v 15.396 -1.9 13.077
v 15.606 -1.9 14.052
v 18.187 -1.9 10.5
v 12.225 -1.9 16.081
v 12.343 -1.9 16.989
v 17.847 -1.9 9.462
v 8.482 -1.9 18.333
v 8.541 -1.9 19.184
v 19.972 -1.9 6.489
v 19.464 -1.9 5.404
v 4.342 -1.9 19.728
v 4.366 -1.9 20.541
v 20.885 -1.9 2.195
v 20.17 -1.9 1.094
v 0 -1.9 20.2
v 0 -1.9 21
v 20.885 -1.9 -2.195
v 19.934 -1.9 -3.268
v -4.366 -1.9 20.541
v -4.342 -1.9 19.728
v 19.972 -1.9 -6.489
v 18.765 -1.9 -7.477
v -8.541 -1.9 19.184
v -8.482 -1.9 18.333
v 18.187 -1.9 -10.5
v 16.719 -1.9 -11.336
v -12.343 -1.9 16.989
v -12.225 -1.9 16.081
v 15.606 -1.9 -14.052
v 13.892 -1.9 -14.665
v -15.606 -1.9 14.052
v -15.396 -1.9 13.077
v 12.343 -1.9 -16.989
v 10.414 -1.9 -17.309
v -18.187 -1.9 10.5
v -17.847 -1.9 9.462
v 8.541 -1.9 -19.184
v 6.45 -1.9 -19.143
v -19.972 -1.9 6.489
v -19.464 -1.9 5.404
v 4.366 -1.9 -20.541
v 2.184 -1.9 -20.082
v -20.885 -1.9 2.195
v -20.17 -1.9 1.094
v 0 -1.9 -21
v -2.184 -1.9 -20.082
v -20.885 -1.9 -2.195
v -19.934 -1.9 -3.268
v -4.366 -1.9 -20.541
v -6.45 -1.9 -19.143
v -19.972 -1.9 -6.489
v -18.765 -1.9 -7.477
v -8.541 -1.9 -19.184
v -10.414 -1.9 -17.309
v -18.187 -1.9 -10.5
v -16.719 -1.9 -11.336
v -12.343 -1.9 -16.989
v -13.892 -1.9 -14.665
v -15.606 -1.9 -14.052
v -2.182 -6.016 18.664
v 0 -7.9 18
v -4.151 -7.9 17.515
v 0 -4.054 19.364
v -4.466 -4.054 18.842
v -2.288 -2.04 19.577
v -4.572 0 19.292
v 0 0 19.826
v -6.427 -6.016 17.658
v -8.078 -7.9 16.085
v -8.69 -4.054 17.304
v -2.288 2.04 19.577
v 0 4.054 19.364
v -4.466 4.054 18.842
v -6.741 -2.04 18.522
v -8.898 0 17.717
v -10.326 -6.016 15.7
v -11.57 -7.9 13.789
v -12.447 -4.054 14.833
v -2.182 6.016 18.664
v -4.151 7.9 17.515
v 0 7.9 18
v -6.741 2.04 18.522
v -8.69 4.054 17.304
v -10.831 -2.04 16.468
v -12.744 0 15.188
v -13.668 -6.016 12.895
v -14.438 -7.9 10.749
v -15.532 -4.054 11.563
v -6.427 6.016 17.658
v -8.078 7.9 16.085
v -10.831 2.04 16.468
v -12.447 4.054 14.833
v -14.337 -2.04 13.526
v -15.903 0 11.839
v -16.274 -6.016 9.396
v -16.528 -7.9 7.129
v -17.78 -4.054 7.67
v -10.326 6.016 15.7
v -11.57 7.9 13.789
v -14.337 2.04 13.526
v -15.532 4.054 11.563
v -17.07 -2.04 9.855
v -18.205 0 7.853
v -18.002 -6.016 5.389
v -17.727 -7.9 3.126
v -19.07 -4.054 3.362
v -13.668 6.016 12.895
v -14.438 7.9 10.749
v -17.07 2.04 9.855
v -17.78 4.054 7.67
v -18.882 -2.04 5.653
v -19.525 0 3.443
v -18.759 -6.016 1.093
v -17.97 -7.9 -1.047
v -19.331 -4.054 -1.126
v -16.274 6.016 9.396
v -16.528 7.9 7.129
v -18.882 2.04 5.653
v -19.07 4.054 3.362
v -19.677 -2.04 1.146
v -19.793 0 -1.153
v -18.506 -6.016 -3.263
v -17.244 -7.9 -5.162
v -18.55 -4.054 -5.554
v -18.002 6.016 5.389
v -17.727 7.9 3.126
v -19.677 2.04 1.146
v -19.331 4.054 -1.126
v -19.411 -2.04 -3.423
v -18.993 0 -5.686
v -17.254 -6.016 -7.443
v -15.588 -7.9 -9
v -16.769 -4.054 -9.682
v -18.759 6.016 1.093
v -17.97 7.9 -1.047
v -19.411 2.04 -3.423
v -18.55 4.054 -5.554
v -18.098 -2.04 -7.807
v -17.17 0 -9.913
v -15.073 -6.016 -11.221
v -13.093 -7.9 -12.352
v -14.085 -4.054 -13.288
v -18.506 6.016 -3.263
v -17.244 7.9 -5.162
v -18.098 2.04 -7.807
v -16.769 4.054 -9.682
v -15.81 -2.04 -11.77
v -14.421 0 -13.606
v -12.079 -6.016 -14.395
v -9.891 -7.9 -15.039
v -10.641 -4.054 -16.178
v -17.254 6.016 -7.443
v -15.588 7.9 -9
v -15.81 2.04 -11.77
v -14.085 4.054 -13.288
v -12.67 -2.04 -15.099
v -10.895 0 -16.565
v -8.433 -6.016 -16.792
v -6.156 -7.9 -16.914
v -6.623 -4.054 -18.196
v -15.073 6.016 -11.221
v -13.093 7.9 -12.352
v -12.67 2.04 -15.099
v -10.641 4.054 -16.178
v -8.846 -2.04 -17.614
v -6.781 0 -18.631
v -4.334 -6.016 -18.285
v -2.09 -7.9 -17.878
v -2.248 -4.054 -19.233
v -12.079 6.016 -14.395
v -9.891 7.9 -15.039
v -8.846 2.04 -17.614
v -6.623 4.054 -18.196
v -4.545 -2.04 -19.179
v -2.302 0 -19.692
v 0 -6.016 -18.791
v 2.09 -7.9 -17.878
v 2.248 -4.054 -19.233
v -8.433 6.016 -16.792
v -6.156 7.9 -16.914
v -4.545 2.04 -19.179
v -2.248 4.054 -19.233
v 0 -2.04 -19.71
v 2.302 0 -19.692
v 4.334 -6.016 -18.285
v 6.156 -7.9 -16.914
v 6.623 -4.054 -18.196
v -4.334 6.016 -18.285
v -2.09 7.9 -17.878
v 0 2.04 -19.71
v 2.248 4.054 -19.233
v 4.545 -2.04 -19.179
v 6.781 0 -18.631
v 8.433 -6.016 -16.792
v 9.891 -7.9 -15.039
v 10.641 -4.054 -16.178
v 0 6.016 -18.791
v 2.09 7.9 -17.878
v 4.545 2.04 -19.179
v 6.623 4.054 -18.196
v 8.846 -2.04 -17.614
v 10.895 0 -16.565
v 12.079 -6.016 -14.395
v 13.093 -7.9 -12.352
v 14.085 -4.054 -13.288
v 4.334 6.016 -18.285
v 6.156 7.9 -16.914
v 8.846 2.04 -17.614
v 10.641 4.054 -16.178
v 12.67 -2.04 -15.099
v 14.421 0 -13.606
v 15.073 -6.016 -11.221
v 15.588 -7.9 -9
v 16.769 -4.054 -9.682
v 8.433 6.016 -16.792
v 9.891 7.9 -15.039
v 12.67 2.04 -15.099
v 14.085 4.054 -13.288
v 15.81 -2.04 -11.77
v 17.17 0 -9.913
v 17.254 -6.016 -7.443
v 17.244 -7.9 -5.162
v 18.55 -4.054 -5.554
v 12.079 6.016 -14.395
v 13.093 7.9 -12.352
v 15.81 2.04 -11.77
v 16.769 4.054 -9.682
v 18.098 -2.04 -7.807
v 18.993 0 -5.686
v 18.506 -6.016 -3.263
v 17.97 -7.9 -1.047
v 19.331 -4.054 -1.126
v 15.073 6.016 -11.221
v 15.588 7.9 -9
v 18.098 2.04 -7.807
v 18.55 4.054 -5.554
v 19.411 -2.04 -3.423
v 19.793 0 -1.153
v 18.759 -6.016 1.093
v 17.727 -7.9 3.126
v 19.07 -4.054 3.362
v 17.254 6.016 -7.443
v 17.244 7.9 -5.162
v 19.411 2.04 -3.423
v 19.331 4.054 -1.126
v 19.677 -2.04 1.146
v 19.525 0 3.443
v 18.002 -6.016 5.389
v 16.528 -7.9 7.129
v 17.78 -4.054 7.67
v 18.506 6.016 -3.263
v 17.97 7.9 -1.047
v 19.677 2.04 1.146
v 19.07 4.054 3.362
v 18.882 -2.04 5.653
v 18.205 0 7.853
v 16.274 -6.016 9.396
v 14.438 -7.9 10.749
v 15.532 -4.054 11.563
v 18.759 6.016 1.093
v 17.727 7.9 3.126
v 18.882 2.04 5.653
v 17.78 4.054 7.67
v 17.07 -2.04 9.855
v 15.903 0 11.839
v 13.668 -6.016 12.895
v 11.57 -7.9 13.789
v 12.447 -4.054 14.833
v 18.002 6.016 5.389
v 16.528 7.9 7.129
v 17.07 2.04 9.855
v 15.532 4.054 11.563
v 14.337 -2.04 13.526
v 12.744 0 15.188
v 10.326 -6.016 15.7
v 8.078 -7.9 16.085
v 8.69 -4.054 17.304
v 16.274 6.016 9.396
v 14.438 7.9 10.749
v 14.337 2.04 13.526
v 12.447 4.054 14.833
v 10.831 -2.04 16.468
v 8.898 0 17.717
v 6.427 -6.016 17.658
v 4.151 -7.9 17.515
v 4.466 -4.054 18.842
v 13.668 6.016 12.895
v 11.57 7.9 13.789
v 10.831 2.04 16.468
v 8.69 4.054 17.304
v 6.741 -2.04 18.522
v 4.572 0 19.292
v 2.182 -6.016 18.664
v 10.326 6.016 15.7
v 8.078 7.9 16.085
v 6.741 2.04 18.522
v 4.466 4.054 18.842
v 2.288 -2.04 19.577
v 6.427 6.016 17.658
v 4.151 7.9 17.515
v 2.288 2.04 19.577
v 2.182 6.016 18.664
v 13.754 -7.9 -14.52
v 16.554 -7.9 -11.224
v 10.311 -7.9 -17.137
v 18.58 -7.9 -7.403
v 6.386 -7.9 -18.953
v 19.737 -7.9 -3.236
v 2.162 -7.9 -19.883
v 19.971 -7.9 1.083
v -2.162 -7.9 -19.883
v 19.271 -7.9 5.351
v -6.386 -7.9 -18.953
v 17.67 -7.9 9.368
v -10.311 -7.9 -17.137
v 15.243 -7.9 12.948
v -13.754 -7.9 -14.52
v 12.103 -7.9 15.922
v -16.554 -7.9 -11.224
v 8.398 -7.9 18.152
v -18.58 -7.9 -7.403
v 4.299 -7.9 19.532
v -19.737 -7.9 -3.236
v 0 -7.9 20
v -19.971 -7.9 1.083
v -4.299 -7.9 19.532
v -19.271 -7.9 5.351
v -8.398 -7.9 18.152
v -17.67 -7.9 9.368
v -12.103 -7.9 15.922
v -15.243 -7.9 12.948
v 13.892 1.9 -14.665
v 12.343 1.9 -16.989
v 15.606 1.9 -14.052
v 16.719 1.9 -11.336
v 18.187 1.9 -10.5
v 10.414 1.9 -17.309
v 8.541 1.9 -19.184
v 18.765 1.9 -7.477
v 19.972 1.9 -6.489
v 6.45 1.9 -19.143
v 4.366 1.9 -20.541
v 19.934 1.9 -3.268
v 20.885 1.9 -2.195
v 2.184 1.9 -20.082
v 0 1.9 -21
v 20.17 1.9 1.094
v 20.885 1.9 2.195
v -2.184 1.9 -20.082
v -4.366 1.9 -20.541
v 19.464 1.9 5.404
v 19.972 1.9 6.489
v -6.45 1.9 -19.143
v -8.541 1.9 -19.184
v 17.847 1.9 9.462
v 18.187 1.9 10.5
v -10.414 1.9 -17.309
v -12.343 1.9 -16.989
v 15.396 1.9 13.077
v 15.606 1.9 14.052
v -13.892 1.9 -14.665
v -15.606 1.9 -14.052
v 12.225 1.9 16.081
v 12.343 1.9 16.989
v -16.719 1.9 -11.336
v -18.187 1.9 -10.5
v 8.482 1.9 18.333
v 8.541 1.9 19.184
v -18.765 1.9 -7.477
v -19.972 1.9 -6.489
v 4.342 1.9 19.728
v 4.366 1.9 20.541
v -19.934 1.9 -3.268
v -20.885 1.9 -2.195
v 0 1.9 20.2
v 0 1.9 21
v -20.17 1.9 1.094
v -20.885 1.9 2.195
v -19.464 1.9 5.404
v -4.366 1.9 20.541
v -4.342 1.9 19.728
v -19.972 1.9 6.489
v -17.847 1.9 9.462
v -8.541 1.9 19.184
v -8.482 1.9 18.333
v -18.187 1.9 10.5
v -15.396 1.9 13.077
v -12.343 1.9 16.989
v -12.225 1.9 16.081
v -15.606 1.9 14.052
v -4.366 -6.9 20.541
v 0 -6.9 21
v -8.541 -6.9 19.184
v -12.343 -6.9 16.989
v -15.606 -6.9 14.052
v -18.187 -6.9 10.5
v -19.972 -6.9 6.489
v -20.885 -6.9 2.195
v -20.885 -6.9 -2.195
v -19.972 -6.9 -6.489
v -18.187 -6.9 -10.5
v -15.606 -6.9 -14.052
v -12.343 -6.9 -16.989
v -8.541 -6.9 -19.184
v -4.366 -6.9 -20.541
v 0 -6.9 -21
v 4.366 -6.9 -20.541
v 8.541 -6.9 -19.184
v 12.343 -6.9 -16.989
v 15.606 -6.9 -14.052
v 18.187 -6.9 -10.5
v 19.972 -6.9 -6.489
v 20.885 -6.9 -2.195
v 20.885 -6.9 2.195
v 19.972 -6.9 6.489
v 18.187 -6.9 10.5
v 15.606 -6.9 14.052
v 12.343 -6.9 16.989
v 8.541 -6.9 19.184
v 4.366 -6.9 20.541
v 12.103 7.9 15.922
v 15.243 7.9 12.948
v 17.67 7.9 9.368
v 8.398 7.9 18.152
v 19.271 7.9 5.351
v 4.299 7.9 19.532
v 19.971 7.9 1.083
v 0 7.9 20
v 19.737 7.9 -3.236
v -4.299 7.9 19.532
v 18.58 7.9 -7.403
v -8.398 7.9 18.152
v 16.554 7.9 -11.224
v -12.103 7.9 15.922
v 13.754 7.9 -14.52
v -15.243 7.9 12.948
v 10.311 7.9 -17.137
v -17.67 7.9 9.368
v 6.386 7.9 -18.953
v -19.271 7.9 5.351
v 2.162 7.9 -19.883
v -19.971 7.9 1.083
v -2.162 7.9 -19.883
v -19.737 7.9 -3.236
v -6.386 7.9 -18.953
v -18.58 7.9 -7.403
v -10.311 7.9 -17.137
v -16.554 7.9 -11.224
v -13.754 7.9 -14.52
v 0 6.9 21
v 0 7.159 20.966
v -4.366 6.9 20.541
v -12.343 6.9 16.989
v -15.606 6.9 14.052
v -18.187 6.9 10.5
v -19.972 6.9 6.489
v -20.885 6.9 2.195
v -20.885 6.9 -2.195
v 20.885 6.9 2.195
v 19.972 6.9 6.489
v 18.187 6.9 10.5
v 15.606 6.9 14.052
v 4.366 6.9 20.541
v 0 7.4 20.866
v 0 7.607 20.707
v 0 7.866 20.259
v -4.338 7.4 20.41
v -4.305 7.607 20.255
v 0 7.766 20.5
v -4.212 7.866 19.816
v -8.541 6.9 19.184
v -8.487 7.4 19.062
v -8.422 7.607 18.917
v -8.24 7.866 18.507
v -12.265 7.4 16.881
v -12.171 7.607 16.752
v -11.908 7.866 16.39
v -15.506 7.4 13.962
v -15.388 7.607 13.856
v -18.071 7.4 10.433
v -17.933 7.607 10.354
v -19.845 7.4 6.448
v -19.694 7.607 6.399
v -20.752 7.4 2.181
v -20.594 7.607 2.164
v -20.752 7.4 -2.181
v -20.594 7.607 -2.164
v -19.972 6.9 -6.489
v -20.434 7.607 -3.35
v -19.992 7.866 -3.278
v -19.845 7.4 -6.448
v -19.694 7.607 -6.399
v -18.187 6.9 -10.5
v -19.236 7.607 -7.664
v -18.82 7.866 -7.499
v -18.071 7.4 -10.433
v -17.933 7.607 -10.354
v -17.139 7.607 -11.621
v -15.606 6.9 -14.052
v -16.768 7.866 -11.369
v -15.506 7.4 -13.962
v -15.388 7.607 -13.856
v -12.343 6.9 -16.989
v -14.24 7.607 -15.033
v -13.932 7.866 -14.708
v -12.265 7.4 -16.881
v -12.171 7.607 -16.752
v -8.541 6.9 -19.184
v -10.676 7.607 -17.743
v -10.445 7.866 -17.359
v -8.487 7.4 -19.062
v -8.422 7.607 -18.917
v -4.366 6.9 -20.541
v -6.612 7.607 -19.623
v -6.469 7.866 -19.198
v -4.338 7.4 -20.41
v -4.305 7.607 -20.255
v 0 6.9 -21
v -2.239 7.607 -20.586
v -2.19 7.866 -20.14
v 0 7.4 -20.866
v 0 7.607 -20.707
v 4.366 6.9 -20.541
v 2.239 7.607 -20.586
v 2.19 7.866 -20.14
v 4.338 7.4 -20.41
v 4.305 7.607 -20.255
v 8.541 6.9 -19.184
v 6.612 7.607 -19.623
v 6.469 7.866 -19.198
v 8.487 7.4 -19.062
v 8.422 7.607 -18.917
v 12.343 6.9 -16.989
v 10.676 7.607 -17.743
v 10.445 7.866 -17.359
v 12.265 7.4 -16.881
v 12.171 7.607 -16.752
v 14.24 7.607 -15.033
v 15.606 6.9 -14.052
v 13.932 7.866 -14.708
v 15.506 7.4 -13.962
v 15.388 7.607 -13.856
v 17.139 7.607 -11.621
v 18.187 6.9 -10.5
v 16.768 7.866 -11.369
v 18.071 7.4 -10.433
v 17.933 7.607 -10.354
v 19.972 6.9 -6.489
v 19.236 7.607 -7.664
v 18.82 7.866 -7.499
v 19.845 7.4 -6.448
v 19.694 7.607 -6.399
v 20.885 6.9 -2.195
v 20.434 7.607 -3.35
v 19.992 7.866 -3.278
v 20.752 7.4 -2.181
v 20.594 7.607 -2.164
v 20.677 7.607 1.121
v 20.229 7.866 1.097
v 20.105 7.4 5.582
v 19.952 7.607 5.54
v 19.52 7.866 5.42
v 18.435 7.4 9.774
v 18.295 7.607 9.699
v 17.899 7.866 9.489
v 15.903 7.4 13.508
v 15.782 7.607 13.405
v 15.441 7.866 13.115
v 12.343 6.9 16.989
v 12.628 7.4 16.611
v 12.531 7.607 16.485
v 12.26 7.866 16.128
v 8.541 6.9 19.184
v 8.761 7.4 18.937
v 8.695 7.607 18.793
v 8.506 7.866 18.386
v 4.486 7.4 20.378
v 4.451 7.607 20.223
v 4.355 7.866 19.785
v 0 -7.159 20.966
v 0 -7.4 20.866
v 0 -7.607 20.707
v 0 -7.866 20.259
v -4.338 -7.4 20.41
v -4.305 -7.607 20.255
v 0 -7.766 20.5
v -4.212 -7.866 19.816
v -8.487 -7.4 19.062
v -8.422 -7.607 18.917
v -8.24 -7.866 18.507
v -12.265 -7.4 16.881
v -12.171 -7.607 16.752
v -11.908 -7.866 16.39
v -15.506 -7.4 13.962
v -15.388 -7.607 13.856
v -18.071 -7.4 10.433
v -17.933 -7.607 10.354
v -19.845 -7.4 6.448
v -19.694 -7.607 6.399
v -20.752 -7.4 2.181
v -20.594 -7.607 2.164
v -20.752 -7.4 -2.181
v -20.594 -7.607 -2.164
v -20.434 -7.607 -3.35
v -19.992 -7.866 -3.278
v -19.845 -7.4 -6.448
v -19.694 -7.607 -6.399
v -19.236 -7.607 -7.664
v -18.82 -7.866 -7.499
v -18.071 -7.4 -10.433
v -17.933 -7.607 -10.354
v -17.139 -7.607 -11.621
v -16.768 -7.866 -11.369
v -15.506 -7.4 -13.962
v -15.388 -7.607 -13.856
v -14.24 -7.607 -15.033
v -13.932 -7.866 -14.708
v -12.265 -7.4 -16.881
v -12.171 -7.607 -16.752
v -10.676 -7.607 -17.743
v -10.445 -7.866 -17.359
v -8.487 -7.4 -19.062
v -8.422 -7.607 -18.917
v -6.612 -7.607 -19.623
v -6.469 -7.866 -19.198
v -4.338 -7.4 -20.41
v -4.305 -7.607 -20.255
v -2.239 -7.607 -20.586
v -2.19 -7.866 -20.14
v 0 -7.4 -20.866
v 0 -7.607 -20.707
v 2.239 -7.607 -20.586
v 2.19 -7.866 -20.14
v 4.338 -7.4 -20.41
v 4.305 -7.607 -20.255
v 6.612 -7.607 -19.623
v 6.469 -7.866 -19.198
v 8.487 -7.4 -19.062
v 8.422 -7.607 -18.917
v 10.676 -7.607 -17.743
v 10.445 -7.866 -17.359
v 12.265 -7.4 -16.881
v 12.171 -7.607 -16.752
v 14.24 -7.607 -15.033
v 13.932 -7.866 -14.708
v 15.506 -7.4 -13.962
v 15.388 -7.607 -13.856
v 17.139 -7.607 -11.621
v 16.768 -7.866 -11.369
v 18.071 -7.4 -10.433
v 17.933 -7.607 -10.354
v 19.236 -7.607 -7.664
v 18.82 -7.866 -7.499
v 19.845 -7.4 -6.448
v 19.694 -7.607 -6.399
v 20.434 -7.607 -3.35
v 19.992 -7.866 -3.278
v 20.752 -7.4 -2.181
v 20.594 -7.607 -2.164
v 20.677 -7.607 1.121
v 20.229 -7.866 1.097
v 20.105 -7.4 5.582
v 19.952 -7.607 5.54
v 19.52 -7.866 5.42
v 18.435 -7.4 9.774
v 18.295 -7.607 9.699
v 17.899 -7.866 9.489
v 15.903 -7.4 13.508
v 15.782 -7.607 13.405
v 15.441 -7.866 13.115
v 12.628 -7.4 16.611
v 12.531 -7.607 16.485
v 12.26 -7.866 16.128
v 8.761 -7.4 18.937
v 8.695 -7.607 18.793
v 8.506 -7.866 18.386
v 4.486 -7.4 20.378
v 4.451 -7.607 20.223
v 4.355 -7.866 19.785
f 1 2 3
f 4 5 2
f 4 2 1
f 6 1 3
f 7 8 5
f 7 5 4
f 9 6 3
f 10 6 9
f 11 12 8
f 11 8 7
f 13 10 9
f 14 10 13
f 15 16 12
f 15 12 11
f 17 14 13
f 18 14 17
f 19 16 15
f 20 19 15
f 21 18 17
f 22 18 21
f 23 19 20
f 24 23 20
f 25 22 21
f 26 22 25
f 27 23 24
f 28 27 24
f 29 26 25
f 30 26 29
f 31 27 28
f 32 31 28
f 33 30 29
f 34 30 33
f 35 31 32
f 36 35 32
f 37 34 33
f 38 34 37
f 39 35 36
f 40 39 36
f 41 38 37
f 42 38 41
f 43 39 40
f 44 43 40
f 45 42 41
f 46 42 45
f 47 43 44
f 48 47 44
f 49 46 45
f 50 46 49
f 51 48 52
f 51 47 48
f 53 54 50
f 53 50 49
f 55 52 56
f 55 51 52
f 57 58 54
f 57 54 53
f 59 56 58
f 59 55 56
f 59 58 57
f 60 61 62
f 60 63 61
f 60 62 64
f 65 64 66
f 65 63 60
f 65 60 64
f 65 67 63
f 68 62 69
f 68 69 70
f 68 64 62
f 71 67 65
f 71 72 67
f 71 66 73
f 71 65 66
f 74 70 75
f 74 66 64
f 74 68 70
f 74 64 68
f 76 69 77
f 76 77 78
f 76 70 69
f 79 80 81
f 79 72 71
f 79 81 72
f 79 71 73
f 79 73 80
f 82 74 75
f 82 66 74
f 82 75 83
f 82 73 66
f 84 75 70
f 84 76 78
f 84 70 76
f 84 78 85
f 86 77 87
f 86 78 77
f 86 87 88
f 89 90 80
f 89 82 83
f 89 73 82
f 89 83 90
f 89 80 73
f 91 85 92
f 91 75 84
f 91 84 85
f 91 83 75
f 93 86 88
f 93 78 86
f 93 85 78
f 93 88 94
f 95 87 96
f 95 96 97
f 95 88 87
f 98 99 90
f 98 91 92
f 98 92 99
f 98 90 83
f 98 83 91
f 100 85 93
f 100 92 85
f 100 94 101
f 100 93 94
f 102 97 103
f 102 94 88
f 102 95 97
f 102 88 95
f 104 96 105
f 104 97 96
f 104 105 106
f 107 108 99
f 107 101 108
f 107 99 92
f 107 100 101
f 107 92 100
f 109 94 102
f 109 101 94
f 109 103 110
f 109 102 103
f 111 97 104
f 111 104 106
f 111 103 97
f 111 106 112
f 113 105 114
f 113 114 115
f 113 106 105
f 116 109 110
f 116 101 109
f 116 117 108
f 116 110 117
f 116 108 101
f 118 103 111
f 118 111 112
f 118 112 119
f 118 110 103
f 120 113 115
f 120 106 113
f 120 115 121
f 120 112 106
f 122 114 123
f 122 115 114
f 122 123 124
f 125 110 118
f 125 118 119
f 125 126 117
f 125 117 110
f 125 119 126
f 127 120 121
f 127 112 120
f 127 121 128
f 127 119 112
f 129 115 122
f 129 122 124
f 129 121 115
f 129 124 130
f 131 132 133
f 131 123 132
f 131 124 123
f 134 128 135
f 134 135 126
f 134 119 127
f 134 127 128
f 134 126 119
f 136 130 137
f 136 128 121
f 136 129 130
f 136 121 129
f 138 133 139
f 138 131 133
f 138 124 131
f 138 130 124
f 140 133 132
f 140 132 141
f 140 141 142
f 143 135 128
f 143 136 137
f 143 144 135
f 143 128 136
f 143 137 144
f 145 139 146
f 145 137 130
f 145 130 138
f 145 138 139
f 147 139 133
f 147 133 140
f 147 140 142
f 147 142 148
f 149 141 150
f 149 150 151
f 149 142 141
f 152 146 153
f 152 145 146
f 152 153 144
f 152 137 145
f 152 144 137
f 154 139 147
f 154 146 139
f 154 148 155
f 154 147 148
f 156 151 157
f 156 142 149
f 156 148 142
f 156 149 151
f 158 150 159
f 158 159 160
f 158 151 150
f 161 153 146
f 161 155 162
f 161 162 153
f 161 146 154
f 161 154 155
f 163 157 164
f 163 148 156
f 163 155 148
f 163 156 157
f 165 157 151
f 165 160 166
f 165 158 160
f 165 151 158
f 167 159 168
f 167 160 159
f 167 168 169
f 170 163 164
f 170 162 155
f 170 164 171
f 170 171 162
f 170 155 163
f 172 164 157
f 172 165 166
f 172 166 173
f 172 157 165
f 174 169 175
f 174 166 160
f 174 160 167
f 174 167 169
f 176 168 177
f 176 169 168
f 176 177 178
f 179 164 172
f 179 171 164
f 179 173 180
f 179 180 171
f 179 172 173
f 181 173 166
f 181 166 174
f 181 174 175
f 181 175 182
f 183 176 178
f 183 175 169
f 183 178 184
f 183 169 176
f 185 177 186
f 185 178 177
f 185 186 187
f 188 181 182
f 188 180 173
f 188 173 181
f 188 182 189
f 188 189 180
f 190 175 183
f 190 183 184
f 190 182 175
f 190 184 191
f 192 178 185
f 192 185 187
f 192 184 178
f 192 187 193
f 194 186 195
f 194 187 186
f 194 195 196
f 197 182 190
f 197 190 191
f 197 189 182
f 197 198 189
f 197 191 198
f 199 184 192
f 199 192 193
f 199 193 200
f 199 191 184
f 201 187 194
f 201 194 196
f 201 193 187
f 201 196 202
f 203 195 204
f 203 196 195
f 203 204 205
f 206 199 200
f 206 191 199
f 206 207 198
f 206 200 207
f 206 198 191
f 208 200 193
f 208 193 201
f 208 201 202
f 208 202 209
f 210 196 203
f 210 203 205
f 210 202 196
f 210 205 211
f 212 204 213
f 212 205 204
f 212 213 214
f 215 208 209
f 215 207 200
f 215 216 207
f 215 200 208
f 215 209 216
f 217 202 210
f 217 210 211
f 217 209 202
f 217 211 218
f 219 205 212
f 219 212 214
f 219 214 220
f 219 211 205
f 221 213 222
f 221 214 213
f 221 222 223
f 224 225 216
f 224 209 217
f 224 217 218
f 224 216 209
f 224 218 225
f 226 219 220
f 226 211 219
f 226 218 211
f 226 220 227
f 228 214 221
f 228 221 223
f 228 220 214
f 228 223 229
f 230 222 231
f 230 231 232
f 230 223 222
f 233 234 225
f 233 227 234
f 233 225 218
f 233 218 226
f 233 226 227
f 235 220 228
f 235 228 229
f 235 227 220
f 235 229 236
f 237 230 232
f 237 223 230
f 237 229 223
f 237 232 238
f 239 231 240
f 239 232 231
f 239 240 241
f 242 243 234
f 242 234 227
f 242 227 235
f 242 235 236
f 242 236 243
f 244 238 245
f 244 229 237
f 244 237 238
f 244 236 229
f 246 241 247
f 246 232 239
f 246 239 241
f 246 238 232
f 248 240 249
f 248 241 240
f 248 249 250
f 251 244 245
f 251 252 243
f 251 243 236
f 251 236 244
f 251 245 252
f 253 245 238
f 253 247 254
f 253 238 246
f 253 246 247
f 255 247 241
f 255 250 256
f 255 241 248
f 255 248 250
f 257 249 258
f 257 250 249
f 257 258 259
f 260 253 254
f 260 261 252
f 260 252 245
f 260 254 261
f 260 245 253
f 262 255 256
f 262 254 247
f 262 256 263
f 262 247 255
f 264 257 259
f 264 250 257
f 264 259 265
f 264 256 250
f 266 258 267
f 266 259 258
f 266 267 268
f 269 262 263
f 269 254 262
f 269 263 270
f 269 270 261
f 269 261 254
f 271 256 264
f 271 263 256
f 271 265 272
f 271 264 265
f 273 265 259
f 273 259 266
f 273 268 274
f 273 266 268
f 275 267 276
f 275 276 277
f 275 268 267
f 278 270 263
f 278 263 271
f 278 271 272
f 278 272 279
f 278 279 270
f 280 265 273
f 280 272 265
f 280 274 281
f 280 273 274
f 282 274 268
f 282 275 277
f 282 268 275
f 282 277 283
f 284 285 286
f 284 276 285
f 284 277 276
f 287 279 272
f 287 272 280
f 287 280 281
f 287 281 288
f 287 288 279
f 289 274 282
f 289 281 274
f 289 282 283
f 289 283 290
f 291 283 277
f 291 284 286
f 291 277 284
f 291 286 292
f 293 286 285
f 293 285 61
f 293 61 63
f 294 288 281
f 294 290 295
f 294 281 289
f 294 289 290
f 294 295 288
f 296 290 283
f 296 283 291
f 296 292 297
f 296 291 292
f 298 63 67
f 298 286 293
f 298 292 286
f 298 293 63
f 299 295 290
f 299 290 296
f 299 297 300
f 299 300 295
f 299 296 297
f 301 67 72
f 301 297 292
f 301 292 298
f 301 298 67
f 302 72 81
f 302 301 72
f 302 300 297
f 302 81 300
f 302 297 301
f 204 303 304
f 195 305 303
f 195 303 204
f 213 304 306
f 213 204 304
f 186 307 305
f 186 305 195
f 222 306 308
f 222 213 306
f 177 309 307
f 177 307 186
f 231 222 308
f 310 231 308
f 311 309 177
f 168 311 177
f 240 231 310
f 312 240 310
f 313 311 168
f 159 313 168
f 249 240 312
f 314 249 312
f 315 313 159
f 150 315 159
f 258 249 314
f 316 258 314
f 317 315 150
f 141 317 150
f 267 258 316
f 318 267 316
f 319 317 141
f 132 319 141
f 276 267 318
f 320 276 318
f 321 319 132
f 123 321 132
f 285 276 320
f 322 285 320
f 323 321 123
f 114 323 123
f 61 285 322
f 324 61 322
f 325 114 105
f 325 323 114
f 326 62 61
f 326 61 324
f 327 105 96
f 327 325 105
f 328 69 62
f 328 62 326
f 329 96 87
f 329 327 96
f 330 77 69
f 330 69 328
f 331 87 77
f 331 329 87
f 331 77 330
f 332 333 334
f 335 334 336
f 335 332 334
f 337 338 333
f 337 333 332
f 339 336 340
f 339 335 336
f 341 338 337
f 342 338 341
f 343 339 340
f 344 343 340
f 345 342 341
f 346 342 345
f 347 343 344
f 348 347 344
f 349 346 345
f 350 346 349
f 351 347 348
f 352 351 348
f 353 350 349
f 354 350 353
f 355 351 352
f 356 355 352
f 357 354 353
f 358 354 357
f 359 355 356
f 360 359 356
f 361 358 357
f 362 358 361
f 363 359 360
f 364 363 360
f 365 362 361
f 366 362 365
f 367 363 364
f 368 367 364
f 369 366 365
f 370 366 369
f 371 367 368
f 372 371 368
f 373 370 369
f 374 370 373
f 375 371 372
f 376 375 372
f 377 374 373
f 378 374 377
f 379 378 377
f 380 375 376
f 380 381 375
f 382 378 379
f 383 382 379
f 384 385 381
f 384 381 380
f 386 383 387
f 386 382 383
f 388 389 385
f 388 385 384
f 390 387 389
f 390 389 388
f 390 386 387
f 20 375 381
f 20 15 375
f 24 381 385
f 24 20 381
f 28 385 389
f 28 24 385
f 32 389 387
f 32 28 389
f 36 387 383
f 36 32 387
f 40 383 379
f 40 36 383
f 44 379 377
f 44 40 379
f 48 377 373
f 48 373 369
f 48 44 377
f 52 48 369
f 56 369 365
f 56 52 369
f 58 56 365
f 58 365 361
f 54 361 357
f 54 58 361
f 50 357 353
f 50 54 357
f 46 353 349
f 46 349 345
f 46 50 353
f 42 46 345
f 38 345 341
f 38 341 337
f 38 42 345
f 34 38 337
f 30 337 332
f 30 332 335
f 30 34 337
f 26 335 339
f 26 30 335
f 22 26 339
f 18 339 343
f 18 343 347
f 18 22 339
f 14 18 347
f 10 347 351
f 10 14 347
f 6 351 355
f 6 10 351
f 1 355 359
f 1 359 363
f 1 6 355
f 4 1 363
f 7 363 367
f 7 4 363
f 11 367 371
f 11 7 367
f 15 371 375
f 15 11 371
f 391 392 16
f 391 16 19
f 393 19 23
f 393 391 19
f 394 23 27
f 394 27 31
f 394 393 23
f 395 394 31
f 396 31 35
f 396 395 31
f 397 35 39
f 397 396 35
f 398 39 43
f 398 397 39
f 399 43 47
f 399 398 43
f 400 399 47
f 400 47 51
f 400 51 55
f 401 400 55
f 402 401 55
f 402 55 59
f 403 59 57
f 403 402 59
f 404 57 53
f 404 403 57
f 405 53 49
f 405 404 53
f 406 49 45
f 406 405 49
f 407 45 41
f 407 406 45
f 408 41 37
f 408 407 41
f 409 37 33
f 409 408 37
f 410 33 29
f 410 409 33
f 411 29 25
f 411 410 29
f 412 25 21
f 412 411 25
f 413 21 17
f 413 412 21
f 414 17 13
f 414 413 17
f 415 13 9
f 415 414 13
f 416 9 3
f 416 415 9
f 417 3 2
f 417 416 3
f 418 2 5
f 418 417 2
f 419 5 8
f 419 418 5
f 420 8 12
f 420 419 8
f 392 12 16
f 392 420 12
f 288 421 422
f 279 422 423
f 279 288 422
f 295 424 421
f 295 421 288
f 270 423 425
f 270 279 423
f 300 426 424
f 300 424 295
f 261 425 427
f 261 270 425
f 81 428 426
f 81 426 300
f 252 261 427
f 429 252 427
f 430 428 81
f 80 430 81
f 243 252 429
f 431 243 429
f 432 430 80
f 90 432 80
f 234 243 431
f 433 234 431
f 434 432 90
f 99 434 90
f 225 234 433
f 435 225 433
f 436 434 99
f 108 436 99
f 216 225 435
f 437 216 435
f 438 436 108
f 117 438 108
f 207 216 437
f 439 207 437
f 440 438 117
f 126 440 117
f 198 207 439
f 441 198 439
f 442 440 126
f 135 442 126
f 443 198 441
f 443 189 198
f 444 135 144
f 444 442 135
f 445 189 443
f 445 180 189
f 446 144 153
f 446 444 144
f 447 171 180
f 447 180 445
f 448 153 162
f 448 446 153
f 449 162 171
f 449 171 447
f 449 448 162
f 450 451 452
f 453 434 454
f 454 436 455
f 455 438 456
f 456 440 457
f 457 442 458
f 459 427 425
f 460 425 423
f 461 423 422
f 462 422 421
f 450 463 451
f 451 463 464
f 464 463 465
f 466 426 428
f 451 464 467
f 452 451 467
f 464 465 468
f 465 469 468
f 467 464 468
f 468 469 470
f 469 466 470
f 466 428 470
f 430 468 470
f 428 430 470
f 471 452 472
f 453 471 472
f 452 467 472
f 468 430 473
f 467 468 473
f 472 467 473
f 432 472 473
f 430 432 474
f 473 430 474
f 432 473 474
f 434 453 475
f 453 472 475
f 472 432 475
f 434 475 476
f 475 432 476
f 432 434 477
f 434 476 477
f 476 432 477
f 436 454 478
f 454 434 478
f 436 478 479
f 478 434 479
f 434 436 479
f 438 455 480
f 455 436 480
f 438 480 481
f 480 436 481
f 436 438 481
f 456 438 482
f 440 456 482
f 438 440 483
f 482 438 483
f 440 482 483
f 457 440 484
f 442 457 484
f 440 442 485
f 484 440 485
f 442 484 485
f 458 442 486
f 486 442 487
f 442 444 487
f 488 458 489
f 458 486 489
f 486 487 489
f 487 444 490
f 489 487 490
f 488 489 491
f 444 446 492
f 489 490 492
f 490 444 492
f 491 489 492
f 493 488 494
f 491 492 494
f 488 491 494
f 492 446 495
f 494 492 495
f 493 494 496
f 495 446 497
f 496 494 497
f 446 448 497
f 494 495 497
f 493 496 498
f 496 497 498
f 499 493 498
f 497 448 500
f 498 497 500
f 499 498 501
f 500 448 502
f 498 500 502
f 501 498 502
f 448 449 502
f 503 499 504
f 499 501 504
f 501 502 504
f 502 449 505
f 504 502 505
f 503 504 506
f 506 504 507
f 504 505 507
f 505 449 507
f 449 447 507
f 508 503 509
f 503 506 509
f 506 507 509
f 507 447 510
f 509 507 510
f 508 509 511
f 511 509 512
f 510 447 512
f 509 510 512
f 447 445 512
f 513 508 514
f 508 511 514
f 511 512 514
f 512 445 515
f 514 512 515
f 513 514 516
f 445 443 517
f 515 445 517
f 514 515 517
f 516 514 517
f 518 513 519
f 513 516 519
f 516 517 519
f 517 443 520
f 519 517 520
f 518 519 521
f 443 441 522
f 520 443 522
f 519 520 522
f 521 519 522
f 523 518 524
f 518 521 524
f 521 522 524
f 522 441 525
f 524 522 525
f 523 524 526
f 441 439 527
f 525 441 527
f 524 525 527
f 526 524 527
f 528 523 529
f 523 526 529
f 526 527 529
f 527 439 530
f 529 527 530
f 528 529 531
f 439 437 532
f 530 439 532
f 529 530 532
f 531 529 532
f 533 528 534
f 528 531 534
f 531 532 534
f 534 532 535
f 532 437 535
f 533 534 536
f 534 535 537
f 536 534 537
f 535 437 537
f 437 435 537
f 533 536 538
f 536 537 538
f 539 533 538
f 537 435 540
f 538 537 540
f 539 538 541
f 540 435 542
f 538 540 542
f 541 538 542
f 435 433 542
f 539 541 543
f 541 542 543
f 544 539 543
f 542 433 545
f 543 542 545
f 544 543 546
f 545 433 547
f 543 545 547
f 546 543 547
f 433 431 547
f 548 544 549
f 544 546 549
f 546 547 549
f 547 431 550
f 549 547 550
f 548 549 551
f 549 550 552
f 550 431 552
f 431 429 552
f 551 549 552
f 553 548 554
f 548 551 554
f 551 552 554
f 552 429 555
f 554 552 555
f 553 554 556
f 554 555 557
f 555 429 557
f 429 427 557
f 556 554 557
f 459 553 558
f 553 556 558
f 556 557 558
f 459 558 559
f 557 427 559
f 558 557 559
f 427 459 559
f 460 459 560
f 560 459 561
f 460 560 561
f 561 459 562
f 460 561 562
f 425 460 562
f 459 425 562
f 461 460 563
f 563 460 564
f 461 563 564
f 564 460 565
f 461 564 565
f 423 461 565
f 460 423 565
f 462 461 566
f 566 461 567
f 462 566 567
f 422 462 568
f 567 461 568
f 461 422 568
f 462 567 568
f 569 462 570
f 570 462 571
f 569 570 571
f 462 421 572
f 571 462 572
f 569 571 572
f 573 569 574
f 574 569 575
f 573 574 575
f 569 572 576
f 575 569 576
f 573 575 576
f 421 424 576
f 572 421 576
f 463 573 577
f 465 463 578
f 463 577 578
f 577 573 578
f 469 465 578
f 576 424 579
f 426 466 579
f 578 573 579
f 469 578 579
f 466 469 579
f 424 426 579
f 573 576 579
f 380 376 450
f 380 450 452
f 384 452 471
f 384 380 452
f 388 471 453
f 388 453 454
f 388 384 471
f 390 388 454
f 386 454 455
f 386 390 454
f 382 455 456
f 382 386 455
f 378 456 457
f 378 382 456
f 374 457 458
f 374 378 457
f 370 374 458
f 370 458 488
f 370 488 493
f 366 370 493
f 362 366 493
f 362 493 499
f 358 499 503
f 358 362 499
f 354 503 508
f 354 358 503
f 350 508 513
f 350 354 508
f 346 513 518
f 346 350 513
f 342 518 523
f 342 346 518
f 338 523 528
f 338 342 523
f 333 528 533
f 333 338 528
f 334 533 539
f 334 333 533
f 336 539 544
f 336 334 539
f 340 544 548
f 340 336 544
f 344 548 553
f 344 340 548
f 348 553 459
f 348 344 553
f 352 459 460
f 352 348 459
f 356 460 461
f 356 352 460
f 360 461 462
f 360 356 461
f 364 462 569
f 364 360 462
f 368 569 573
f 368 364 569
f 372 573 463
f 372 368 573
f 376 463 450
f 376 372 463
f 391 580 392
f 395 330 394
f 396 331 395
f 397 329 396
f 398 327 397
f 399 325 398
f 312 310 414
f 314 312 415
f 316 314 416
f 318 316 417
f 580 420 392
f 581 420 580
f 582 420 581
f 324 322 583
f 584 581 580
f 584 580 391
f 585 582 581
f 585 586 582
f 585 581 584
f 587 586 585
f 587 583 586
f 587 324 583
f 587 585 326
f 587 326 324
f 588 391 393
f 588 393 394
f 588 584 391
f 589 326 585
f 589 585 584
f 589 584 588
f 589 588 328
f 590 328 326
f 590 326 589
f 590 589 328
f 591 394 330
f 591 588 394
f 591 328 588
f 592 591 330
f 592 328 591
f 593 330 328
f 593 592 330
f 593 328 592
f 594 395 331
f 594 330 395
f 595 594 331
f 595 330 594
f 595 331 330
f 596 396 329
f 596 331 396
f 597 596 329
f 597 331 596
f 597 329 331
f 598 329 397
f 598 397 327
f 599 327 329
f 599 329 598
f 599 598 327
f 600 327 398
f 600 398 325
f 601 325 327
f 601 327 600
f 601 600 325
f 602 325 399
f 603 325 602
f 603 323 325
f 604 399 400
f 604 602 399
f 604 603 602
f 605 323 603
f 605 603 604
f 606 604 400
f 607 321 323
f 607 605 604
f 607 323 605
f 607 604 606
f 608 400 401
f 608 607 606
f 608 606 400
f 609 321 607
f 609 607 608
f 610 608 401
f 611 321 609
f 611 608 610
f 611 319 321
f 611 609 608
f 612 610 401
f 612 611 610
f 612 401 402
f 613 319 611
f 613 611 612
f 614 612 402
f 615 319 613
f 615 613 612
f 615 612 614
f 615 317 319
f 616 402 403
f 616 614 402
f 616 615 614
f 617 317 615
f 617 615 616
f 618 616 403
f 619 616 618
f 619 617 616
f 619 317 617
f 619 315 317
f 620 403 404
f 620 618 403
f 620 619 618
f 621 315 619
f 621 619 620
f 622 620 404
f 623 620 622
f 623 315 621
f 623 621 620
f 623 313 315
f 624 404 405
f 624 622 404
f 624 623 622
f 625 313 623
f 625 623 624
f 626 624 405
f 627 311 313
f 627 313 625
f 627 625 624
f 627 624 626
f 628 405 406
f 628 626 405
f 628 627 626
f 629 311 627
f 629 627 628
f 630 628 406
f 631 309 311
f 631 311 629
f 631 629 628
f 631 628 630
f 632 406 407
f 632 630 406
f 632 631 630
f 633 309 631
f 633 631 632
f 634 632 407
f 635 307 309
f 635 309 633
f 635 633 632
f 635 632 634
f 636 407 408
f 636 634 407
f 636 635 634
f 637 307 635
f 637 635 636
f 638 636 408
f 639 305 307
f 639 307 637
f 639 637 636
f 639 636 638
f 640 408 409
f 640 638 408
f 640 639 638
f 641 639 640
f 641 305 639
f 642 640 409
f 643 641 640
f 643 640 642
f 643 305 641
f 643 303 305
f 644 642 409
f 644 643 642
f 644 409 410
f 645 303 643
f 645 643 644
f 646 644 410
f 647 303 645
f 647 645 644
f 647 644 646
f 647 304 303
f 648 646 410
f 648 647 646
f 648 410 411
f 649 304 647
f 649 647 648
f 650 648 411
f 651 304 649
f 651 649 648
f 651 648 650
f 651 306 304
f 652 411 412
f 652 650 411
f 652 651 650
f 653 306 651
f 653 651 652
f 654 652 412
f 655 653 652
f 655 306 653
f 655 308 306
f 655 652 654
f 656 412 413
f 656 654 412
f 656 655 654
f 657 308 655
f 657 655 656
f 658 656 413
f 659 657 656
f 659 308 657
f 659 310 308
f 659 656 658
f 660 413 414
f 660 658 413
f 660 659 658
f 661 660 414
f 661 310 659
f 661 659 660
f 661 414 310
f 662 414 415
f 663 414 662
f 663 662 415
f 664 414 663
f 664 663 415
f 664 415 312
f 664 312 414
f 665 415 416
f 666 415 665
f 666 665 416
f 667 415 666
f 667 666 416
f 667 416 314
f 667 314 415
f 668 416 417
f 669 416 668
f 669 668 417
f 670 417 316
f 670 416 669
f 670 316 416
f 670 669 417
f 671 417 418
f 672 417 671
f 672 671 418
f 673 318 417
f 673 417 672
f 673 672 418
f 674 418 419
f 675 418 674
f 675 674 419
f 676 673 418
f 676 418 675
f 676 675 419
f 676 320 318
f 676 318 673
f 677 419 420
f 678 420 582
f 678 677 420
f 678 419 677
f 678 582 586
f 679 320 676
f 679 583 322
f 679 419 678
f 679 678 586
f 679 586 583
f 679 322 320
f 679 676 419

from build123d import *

# Parameters (mm, degrees)
FILLET1_R = 1


with BuildPart() as part:
    # Sketch1 → Revolve1 (revolve)
    with BuildSketch(Plane(origin=(0, 0, 0), x_dir=(0, 0, -1), z_dir=(1, 0, 0)), mode=Mode.PRIVATE) as revolve1_sk:
        with BuildLine():
            Line((21, 7.9), (21, 1.9))
            Line((21, 1.9), (20.2, 1.9))
            Line((20.2, 1.9), (20.2, -1.9))
            Line((20.2, -1.9), (21, -1.9))
            Line((21, -1.9), (21, -7.9))
            Line((21, -7.9), (18, -7.9))
            ThreePointArc((18, -7.9), (19.826255845, 0), (18, 7.9))
            Line((18, 7.9), (21, 7.9))
        make_face()
    revolve(revolve1_sk.sketch.rotate(Axis((0, 7.9, 0), (0, -1, 0)), 180), axis=Axis((0, 7.9, 0), (0, -1, 0)))  # turned: the seam where the file's is

    # Fillet1
    fillet1_edges = [part.edges().sort_by_distance(p)[0] for p in [
        (0, -7.9, -21),
        (0, 7.9, -21),
    ]]
    fillet(fillet1_edges, radius=FILLET1_R)


solid = part.part
